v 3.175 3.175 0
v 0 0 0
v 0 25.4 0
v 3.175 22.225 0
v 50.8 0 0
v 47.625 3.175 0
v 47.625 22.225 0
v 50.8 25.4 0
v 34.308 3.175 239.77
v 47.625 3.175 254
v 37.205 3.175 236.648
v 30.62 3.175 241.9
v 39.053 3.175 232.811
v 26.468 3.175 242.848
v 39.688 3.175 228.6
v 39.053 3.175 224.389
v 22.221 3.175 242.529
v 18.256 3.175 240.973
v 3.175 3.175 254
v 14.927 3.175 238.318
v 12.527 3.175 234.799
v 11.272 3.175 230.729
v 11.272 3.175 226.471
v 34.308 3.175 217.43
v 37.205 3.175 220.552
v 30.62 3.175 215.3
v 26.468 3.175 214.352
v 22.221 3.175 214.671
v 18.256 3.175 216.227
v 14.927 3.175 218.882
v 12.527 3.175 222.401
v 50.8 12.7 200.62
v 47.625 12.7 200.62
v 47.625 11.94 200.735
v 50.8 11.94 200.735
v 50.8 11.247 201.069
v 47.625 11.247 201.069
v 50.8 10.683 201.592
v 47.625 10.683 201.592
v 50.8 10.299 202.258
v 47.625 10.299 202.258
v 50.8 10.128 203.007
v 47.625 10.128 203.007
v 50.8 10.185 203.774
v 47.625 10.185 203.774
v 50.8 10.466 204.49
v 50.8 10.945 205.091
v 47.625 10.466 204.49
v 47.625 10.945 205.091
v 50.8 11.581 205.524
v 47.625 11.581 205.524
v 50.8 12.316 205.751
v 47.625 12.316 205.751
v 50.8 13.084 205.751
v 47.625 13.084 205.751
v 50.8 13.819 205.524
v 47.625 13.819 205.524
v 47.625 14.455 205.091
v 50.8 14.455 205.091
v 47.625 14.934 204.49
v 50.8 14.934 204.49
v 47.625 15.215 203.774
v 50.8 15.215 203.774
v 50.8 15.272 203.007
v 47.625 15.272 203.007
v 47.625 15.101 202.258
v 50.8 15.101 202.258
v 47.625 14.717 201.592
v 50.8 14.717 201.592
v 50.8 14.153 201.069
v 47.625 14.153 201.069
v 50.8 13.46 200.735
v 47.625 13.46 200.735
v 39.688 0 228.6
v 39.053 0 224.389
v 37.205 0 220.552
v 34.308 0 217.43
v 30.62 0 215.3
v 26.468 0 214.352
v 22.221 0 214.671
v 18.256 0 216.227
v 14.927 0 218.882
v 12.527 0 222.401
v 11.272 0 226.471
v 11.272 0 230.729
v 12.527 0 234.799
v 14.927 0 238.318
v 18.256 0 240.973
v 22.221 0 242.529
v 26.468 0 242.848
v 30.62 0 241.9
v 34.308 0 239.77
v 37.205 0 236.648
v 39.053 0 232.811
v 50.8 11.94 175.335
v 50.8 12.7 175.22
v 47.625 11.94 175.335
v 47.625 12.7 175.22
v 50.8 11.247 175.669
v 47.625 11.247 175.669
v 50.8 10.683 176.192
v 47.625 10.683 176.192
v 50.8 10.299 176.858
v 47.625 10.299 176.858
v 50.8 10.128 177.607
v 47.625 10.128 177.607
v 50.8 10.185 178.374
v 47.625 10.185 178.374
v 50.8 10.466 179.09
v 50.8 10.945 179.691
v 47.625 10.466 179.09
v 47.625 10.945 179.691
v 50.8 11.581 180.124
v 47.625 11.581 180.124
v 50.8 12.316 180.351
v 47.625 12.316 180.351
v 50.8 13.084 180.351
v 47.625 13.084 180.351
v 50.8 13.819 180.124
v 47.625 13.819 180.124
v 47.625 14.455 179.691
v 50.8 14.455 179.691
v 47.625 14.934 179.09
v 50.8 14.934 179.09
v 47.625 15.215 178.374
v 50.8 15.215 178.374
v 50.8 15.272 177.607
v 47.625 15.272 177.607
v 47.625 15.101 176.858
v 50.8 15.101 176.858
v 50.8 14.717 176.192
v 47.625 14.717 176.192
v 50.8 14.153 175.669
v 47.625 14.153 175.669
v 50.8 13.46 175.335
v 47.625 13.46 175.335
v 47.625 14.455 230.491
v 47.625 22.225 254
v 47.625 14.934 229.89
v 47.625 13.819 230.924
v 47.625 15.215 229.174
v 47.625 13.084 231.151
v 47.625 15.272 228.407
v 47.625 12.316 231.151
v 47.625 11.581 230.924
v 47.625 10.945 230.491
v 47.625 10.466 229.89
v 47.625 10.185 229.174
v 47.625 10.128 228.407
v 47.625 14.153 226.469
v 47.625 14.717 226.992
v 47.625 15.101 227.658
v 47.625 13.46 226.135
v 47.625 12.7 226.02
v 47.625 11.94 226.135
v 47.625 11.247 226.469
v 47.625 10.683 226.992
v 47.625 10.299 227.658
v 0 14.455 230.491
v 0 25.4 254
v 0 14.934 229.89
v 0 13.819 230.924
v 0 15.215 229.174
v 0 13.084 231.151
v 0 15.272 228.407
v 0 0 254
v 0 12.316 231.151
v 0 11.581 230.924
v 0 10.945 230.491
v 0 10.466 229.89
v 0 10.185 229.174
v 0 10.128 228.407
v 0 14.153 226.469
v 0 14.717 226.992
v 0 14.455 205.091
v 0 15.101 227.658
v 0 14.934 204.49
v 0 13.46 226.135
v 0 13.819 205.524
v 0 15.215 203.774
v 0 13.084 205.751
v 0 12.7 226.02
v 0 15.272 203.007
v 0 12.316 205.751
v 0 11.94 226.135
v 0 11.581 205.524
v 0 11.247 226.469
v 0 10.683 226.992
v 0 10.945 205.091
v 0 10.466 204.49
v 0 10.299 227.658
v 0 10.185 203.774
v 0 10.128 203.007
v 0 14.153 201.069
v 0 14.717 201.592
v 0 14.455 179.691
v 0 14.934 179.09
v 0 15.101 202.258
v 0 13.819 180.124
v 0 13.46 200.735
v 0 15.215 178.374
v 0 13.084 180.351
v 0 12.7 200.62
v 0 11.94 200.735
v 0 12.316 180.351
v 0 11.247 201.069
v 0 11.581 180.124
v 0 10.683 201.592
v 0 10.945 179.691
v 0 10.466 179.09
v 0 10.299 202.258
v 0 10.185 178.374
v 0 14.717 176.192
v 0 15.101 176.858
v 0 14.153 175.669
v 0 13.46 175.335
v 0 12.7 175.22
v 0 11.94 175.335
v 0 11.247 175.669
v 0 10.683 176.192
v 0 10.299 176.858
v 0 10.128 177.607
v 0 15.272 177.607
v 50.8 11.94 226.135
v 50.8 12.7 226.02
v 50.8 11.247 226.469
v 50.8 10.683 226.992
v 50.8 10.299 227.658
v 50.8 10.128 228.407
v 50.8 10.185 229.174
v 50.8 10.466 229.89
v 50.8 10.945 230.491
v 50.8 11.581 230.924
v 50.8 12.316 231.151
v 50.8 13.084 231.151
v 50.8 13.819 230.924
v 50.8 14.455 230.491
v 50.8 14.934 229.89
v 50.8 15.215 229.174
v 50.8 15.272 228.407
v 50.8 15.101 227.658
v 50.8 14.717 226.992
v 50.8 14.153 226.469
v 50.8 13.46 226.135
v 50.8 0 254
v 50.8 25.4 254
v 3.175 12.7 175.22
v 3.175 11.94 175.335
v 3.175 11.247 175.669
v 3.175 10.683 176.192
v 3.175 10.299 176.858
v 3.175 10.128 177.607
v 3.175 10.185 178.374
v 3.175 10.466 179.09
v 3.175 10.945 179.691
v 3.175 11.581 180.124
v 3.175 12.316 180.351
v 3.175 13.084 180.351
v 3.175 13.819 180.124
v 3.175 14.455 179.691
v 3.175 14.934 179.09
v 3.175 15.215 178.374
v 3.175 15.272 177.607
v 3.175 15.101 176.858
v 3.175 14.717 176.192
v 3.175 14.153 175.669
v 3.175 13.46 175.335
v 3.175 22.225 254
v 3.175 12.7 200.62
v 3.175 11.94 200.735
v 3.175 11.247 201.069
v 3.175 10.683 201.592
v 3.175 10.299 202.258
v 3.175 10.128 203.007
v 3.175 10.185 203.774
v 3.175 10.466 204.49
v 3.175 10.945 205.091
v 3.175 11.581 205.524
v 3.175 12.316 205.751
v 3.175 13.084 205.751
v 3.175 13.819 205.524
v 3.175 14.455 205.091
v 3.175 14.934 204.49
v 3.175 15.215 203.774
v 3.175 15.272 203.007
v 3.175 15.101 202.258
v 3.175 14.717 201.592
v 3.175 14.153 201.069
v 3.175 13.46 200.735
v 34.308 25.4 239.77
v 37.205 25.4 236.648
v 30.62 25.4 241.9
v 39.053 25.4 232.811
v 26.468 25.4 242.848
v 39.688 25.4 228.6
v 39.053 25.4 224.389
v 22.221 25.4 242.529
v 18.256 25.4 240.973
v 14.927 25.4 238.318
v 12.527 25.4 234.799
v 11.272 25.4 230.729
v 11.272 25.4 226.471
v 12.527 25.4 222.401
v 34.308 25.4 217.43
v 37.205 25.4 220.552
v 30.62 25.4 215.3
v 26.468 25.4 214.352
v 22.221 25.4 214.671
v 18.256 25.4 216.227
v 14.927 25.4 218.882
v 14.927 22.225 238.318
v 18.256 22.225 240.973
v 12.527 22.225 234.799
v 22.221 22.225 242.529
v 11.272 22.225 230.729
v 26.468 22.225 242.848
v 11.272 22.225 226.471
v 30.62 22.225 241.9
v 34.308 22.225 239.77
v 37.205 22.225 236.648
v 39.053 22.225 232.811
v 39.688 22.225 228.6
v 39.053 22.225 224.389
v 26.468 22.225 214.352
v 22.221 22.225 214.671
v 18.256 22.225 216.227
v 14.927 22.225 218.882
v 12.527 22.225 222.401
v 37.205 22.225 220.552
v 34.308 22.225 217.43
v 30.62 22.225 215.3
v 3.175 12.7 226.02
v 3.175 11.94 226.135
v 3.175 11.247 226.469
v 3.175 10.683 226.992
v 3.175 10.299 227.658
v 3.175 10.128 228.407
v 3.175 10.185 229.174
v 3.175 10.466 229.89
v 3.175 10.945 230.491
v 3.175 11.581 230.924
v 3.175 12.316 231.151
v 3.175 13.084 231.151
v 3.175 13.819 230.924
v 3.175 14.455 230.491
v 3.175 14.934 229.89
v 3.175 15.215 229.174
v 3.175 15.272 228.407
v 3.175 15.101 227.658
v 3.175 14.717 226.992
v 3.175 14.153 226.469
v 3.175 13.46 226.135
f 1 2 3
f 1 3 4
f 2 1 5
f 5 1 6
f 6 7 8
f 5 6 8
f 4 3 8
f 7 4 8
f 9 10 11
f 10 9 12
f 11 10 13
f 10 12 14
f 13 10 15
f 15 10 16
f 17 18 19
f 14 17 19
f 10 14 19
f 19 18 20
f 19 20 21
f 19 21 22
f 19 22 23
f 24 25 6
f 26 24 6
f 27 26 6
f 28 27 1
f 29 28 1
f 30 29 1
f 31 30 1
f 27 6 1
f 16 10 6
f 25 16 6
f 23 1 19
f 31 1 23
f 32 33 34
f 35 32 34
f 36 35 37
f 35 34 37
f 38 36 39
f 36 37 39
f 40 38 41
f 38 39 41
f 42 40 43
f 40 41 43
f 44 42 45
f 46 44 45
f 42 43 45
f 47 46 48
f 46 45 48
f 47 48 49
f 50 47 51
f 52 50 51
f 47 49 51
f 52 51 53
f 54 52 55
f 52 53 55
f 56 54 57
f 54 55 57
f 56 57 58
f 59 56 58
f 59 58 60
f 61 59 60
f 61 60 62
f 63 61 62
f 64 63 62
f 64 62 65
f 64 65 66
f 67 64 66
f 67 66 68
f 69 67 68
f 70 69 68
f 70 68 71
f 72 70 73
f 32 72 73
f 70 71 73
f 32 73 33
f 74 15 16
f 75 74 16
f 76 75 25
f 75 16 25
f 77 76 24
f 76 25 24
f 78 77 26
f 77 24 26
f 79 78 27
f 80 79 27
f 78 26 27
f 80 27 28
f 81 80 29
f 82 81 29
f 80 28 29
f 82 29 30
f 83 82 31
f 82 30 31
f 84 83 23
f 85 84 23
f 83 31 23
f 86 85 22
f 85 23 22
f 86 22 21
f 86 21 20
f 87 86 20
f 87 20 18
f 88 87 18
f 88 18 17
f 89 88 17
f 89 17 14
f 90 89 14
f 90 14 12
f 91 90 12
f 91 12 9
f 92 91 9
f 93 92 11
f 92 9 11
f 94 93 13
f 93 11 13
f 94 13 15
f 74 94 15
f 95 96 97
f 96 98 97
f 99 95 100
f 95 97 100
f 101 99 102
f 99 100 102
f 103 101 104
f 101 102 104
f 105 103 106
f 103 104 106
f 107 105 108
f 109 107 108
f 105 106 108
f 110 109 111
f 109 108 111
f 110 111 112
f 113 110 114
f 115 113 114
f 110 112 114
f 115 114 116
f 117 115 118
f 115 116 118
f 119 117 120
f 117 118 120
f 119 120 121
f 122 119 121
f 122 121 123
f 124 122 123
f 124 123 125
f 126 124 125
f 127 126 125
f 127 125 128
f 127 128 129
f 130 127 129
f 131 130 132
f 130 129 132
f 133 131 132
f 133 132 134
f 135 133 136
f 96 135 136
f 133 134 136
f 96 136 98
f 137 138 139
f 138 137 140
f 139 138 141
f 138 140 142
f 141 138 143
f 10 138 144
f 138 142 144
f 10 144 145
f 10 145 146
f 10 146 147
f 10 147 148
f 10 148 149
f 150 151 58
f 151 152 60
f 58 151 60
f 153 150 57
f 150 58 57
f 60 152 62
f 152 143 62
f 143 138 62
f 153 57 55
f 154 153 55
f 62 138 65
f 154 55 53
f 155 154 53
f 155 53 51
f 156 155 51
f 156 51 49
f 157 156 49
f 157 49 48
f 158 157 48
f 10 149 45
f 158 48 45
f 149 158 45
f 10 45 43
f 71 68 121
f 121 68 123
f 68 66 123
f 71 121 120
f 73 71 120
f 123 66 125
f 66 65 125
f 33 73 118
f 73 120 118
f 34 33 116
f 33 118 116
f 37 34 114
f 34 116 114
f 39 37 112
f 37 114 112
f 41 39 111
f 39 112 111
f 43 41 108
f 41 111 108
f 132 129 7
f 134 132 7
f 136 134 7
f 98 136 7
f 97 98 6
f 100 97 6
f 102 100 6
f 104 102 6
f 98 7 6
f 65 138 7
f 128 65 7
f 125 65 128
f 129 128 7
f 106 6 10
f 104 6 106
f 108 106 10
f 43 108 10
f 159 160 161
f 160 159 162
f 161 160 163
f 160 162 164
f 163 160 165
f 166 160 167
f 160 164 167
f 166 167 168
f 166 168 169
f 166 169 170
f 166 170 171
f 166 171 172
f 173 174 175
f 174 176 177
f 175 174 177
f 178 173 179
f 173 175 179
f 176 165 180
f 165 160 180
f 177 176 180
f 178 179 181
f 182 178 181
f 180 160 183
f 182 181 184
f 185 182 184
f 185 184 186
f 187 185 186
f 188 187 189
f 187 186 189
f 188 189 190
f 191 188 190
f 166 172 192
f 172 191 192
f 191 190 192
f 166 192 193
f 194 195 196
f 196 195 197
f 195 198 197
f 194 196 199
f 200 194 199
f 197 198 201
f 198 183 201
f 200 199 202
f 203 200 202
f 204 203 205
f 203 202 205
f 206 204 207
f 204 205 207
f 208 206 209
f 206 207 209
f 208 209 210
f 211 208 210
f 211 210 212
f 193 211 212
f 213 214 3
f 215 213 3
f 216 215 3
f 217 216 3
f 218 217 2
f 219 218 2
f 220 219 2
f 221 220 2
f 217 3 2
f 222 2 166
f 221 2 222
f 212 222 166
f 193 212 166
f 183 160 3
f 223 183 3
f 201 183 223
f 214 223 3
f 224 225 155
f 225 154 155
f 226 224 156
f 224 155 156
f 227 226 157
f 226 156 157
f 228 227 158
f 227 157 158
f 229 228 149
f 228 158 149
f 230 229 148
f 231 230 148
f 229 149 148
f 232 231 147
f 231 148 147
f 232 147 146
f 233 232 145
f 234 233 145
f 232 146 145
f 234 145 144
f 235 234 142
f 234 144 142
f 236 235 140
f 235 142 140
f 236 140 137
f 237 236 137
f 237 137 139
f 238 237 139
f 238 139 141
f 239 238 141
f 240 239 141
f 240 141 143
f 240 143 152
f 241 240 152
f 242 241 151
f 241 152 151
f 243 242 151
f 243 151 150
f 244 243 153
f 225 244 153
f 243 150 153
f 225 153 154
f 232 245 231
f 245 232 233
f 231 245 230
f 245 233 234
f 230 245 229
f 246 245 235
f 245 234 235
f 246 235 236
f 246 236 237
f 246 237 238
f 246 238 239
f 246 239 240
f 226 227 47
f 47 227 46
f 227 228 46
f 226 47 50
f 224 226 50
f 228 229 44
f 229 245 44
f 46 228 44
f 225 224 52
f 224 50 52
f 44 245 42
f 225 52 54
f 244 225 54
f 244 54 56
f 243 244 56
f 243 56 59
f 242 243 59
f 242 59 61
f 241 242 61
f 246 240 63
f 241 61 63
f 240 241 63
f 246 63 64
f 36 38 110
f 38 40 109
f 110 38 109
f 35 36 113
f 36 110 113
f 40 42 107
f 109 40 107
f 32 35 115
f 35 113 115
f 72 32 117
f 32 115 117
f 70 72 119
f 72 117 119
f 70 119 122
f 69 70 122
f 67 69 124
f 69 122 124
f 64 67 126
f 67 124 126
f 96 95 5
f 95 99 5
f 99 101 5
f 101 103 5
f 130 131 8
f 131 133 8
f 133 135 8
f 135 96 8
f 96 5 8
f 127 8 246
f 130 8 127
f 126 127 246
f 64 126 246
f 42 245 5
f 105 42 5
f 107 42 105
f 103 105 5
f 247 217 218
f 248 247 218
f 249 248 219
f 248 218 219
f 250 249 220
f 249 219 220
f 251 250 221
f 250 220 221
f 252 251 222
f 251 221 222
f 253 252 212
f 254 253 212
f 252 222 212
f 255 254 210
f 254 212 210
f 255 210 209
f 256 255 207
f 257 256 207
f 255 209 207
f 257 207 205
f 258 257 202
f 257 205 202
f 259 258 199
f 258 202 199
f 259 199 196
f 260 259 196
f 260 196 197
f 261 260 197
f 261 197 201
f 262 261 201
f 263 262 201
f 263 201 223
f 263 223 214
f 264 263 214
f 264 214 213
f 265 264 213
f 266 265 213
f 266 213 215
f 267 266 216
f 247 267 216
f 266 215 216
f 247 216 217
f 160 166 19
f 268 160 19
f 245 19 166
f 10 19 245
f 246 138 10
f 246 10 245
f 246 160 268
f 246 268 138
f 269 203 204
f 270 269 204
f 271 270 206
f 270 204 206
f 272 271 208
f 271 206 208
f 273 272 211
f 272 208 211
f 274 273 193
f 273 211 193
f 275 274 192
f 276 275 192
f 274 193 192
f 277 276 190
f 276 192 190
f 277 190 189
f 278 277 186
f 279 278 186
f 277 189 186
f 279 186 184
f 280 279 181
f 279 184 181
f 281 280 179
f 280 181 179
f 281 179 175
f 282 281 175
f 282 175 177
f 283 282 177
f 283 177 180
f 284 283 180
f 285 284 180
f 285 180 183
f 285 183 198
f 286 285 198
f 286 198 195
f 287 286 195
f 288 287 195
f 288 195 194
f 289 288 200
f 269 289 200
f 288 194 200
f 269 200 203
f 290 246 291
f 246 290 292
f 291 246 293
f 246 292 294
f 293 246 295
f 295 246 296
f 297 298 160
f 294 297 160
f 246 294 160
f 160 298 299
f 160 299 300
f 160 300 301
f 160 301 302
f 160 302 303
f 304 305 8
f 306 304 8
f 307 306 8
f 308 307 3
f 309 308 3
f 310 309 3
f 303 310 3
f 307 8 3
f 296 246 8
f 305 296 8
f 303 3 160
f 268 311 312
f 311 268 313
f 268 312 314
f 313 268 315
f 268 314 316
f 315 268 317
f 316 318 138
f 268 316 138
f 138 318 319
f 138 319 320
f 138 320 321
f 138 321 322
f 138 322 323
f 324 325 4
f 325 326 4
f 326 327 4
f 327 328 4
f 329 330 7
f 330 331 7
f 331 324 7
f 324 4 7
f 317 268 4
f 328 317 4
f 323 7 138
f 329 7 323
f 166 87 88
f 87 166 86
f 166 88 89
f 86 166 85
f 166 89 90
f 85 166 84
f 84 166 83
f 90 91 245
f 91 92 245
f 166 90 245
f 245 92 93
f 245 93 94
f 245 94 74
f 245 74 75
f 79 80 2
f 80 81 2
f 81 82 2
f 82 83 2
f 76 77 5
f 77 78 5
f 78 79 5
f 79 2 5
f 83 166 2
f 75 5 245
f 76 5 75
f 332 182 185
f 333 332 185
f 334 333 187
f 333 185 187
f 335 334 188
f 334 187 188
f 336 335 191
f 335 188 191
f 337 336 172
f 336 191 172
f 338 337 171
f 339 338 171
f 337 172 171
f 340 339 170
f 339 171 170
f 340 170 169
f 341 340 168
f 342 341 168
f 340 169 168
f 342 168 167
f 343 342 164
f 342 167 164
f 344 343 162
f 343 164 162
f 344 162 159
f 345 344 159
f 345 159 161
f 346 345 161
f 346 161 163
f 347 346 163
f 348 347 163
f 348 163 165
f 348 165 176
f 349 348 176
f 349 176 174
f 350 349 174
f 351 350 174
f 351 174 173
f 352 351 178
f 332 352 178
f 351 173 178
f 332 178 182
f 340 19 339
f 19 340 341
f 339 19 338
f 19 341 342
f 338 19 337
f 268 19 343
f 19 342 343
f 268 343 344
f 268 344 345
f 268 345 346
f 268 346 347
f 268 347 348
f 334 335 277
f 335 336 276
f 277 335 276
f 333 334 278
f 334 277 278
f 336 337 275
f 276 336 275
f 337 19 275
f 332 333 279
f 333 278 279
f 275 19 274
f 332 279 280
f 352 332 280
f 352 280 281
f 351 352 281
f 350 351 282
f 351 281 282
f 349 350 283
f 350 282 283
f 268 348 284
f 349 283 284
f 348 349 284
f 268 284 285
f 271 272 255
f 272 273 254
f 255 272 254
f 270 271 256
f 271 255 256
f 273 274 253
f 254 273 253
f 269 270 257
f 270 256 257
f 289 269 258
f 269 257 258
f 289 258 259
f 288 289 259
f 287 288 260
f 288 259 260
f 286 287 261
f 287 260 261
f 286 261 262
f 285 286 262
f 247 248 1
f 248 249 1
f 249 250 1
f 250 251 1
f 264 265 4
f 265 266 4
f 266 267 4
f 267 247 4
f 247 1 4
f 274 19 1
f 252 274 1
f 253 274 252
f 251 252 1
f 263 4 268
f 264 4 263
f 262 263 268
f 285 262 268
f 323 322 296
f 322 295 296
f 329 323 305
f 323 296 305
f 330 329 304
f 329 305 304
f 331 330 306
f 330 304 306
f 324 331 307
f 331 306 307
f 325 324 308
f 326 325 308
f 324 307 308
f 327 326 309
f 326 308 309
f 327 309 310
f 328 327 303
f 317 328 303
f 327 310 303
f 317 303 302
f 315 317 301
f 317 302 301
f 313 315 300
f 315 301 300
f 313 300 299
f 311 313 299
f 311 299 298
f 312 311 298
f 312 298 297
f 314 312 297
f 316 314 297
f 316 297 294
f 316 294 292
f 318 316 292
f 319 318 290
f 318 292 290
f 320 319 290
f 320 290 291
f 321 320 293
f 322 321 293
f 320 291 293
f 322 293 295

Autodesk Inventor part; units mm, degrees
ref_plane "YZ Plane" through (0, 0, 0) normal (1, 0, 0) x (0, 1, 0)
ref_plane "XZ Plane" through (0, 0, 0) normal (0, 1, 0) x (-1, 0, 0)
ref_plane "XY Plane" through (0, 0, 0) normal (0, 0, 1) x (1, 0, 0)
sketch "Sketch1" plane through (0, 0, 0) normal (0, 0, 1) x (1, 0, 0)
  line L0 (0, 0) -> (50.8, 0)
  line L1 (50.8, 0) -> (50.8, 25.4)
  line L2 (50.8, 25.4) -> (0, 25.4)
  line L3 (0, 25.4) -> (0, 0)
  line L4 (3.175, 22.225) -> (47.625, 22.225)
  line L5 (47.625, 22.225) -> (47.625, 3.175)
  line L6 (47.625, 3.175) -> (3.175, 3.175)
  line L7 (3.175, 3.175) -> (3.175, 22.225)
  dimension "d0" = 50.8
  dimension "d1" = 25.4
  dimension "d2" = 3.175
extrude "Extrusion1" add sketch "Sketch1" along normal blind 254
sketch "Sketch2" plane through (0, 0, 0) normal (0, -1, 0) x (1, 0, 0)
  circle A0 centre (25.4, 228.6) radius 4.7625
  line L0 (47.625, 254) -> (3.175, 254) projected
  line L1 (0, 0) -> (0, 254) projected
  dimension "d5" = 9.525
  dimension "d6" = 25.4
  dimension "d7" = 25.4
extrude "Extrusion2" cut sketch "Sketch2" against normal blind 25.4
sketch "Sketch3" plane through (0, 25.4, 0) normal (0, 1, 0) x (1, 0, 0)
  circle A0 centre (25.4, -228.6) radius 4.7625 projected
  circle A1 centre (25.4, -228.6) radius 14.2875
  point P0 (0, 0)
  dimension "d10" = 28.575
extrude "Extrusion3" cut sketch "Sketch3" against normal blind 25.4
ref_plane "Work Plane1" through (25.4, 0, 228.6) normal (0, 0, -1) x (1, 0, 0)
sketch "Sketch5" plane through (50.8, 0, 0) normal (1, 0, 0) x (0, 0, -1)
  line L0 (-254, 0) -> (-254, 25.4) projected
  line L1 (0, 0) -> (-254, 0) projected
  line L2 (0, 25.4) -> (-254, 25.4) projected
  point P0 (-228.6, 12.7)
  point P1 (-203.2, 12.7)
  point P2 (-177.8, 12.7)
  dimension "d21" = 25.4
  dimension "d22" = 12.7
  dimension "d23" = 25.4
  dimension "d24" = 25.4
  dimension "d25" = 12.7
  dimension "d26" = 12.7
hole "Hole1" at (50.8, 12.7, 228.6) at (50.8, 12.7, 203.2) at (50.8, 12.7, 177.8) direction (-1, 0, 0) diameter 5.1594 end through all
thread "Thread1" size "12-24 UNC" class "2B" standard "ANSI Unified Screw Threads" full length
thread "Thread2" size "12-24 UNC" class "2B" standard "ANSI Unified Screw Threads" full length
thread "Thread3" size "12-24 UNC" class "2B" standard "ANSI Unified Screw Threads" full length
properties part number "15102898-16-A-0201" material "Aluminum 6061"
